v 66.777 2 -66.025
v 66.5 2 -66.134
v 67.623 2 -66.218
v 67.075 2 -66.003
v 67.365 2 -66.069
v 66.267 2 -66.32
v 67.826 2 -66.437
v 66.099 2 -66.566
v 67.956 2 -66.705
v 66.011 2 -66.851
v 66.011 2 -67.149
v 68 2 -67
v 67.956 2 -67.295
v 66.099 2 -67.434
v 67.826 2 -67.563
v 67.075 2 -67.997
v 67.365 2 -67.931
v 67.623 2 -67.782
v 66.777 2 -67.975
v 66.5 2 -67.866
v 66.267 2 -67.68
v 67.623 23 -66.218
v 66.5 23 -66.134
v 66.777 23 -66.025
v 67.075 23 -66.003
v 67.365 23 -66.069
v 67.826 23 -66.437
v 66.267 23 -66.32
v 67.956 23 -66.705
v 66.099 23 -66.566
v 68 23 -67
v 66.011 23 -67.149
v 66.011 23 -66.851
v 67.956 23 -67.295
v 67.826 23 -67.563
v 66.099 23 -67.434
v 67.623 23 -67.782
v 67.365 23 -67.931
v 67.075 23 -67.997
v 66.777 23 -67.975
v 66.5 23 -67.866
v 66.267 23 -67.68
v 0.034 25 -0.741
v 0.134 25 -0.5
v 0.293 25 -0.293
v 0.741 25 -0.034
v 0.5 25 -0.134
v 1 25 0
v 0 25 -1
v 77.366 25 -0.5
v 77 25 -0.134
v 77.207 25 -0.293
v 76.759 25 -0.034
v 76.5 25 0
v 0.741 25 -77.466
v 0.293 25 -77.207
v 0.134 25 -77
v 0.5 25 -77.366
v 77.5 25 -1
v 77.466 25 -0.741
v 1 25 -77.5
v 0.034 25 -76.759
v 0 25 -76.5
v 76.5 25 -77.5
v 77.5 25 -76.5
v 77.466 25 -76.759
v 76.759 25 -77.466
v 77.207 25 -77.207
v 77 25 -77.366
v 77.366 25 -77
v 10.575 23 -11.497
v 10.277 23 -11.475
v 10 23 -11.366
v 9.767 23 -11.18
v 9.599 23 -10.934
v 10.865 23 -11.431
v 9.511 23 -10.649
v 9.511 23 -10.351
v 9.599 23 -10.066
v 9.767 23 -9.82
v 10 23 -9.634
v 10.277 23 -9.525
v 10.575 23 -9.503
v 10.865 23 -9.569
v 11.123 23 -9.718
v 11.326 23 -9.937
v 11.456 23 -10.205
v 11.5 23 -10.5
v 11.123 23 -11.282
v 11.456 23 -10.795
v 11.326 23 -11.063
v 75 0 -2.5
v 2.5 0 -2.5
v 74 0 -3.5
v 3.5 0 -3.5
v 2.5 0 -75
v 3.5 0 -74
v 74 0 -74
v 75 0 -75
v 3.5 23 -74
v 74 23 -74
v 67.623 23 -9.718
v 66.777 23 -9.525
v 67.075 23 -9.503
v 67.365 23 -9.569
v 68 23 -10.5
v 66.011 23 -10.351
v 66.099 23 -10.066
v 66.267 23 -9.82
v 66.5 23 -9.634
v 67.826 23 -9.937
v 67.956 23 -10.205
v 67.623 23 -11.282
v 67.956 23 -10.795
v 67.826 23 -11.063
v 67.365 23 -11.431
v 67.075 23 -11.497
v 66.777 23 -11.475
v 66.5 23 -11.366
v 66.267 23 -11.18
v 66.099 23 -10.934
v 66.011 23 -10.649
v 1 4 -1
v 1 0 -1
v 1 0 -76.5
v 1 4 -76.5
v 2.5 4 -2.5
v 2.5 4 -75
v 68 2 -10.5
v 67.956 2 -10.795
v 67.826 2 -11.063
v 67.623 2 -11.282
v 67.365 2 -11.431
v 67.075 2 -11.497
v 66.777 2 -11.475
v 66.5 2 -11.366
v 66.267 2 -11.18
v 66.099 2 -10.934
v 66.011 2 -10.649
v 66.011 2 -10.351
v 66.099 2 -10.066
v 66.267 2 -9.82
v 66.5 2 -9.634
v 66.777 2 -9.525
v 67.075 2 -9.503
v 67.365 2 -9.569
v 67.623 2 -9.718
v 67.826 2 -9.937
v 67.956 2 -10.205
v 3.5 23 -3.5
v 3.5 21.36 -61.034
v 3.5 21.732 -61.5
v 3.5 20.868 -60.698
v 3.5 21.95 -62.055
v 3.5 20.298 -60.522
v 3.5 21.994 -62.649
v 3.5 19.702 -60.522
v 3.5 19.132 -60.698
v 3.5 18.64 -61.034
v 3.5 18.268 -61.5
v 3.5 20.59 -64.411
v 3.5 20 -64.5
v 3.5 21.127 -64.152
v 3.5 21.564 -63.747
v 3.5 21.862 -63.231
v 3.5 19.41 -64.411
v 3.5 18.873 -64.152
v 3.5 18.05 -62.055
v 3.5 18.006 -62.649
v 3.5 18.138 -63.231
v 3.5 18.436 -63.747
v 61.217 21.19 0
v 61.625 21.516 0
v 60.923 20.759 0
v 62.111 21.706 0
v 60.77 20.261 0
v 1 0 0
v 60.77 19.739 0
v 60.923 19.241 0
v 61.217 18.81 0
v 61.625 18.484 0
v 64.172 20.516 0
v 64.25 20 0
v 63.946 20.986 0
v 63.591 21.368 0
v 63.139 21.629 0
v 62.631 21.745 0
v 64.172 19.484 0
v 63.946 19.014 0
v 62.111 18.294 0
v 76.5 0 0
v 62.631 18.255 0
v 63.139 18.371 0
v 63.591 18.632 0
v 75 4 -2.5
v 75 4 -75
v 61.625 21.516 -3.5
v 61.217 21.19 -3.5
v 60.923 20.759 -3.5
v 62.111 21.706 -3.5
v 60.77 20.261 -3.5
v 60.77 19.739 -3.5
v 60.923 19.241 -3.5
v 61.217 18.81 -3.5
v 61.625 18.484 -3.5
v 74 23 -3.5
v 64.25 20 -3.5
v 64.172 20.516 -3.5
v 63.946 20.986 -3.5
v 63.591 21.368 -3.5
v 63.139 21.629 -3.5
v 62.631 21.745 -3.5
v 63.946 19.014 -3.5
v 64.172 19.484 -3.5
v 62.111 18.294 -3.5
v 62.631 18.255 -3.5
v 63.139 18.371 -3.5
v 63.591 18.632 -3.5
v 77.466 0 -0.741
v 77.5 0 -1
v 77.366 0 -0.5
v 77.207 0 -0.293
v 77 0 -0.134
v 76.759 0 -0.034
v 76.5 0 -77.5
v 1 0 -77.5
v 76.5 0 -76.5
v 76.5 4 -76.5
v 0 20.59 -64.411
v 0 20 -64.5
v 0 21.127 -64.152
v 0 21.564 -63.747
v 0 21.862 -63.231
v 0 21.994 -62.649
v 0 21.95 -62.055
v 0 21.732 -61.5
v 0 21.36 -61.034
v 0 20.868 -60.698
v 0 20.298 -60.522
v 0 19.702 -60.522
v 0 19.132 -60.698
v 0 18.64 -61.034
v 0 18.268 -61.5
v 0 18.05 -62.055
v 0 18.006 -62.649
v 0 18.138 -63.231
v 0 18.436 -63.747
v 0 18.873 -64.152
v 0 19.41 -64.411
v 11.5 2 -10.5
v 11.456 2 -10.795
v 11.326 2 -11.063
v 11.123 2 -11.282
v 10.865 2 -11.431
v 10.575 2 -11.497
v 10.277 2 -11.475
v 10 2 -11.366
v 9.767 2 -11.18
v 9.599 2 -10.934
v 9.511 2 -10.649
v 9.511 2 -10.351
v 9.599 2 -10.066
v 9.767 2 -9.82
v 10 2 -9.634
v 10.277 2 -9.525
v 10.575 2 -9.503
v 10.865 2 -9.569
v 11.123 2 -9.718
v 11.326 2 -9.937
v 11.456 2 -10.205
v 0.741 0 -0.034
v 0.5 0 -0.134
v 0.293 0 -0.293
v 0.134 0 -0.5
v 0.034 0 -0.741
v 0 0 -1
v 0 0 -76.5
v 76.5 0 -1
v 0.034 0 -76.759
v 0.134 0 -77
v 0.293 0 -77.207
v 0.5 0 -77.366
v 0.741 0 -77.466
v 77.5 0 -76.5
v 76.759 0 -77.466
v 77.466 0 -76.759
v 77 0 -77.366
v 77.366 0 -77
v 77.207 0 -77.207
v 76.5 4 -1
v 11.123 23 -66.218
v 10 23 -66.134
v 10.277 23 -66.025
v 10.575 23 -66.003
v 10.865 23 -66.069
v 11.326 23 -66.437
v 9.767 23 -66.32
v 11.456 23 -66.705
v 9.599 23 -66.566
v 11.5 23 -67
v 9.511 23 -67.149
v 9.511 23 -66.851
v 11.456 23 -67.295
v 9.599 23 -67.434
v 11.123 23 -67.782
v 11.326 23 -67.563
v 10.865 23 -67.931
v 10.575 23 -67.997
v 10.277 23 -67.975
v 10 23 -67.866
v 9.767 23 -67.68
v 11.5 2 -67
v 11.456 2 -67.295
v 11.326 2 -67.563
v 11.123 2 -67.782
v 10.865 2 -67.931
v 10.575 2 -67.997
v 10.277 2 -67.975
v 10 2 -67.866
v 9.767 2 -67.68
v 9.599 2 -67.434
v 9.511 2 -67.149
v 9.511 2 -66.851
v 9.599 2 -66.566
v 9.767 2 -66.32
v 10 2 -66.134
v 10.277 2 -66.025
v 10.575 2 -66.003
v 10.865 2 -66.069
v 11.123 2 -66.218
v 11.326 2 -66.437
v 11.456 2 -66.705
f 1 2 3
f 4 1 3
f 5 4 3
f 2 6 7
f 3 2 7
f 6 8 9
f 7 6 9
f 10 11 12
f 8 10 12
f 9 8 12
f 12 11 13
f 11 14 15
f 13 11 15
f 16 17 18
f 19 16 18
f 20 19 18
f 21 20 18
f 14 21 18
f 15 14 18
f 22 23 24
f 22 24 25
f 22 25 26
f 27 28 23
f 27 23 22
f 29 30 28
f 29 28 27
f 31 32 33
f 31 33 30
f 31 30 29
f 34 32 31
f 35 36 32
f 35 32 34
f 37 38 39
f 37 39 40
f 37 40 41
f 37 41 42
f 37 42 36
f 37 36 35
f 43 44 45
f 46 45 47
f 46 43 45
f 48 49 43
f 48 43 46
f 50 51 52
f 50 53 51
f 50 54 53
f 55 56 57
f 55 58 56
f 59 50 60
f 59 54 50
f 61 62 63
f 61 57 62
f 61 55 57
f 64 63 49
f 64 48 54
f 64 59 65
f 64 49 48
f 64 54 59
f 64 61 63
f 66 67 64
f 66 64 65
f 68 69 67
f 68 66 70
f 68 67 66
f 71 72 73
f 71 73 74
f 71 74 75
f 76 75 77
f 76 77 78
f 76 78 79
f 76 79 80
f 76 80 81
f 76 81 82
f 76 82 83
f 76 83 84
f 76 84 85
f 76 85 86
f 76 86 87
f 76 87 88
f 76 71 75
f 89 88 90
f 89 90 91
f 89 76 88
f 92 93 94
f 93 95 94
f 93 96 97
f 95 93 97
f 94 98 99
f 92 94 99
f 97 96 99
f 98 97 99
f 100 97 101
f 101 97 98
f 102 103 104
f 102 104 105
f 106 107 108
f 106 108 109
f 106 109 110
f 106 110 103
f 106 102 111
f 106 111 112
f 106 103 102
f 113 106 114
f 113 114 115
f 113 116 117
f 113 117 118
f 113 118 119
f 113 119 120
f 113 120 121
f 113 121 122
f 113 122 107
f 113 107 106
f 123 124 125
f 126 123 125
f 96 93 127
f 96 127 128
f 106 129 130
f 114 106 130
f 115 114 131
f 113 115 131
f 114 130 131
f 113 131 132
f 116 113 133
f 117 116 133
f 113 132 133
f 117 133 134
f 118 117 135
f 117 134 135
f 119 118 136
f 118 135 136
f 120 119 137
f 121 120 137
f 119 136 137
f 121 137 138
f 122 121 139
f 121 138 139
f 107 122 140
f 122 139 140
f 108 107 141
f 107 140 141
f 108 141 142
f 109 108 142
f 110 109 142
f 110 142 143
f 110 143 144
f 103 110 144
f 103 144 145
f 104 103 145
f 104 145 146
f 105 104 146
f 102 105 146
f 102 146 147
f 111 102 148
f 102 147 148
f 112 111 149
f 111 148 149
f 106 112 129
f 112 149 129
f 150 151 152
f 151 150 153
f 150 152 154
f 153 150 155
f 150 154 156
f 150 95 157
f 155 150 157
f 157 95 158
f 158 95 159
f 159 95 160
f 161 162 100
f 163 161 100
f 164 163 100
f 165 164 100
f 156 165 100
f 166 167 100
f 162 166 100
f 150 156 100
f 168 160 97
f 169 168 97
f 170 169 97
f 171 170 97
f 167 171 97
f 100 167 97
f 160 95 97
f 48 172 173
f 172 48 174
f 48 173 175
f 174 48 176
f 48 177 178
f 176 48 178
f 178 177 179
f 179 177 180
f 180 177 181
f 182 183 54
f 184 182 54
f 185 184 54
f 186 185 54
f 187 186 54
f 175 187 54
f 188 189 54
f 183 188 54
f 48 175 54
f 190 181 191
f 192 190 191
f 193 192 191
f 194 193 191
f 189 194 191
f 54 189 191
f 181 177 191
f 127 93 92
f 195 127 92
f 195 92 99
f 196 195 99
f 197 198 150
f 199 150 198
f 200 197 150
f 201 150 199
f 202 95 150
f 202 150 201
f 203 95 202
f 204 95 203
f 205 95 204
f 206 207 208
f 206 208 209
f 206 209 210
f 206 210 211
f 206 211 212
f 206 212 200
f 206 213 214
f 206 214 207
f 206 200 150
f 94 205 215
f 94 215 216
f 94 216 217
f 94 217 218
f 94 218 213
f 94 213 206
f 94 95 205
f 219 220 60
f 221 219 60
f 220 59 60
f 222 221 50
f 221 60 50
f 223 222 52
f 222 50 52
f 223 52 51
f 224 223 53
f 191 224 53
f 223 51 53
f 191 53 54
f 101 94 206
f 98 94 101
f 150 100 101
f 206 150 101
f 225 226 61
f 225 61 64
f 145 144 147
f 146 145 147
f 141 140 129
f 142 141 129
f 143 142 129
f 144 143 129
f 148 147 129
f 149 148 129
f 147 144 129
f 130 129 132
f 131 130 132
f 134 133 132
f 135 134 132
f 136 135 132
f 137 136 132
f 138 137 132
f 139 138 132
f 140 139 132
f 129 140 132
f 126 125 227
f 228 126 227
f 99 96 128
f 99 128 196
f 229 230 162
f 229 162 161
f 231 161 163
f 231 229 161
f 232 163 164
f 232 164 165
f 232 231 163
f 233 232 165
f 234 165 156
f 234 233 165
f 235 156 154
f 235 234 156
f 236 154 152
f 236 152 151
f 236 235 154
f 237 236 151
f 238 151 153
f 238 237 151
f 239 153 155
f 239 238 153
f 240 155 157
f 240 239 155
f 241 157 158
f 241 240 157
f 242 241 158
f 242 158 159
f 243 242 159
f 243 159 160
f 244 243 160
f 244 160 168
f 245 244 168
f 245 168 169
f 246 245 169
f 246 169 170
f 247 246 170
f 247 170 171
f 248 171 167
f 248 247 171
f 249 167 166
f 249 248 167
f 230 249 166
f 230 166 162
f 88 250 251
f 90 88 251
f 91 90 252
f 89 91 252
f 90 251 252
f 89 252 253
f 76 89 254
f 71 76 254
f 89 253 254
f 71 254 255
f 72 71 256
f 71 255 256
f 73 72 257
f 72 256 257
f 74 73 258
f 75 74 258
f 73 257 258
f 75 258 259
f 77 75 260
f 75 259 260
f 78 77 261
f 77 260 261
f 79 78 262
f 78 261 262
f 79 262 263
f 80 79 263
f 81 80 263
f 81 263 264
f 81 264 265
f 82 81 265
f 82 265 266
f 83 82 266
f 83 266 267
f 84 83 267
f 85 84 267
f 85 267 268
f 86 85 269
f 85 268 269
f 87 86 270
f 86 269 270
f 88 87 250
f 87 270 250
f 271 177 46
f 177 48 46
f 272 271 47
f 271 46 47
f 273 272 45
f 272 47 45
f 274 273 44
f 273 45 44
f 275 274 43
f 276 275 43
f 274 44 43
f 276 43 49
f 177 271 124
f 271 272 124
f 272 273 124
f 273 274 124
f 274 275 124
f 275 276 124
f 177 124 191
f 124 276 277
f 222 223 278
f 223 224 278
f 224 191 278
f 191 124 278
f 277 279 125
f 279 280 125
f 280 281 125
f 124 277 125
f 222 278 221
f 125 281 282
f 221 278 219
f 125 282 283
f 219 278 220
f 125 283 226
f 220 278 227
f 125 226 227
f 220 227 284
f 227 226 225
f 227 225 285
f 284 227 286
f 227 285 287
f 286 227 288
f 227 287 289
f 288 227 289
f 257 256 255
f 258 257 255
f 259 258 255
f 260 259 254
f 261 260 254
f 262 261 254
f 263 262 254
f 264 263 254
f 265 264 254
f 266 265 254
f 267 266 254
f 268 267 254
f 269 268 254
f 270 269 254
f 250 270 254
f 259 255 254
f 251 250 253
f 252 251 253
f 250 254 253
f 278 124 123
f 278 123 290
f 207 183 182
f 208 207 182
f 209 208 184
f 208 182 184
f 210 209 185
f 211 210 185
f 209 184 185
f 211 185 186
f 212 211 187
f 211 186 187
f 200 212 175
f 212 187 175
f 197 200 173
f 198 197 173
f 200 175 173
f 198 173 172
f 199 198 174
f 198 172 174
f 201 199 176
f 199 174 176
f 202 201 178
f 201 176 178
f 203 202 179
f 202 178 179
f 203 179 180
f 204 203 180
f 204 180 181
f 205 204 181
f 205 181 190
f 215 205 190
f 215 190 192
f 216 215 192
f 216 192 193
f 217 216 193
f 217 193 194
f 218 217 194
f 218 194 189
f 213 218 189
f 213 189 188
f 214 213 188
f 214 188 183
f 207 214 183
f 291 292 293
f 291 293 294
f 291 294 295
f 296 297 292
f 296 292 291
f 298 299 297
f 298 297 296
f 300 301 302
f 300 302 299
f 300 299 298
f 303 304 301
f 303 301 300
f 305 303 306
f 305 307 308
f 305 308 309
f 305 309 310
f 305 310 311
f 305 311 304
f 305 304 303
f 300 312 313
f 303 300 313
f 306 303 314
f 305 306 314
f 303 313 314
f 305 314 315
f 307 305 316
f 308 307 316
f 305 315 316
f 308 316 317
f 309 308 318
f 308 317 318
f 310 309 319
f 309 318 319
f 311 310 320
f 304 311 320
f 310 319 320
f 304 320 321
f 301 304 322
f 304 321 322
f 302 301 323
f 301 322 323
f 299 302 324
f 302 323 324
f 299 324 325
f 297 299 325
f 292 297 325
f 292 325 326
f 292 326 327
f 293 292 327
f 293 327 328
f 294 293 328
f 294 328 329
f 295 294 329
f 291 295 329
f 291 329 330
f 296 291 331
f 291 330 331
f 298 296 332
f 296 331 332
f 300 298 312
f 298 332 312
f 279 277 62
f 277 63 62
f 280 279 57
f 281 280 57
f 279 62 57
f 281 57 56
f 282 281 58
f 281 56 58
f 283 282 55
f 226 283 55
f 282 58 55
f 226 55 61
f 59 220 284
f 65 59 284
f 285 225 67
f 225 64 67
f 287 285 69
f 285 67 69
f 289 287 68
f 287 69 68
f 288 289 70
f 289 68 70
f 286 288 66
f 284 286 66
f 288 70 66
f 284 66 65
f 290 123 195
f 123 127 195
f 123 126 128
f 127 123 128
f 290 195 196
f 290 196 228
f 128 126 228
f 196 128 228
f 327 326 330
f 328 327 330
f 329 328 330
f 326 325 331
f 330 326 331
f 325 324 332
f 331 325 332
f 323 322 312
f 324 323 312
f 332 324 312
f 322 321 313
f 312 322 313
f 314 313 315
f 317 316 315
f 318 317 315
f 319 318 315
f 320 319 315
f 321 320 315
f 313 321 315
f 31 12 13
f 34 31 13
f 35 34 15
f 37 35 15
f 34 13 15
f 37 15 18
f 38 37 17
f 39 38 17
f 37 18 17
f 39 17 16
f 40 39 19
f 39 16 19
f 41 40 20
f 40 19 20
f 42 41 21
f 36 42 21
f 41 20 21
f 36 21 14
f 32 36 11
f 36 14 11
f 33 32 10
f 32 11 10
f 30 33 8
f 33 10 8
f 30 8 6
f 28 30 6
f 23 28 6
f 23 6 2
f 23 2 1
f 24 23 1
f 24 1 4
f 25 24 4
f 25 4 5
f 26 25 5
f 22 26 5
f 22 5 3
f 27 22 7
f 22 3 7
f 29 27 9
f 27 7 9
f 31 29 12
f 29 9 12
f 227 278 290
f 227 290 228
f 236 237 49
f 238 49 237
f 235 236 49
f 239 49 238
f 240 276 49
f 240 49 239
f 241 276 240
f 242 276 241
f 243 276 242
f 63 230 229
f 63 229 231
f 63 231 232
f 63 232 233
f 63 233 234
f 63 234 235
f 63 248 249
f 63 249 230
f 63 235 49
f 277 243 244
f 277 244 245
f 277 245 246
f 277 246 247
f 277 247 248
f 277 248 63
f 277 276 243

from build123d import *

# Parameters (mm, degrees)
SKETCH1_W             = 77.5
SKETCH1_H             = 77.5
BOSS_EXTRUDE1_DEPTH   = 25
SKETCH2_W             = 70.5
SKETCH2_H             = 70.5
CUT_EXTRUDE1_DEPTH    = 23
SKETCH4_W             = 75.5
SKETCH4_H             = 75.5
SKETCH4_W_2           = 72.5
SKETCH4_H_2           = 72.5
CUT_EXTRUDE3_DEPTH    = 4
BOSS_EXTRUDE2_START   = 2
SKETCH5_R             = 1
BOSS_EXTRUDE2_DEPTH   = 21
BOSS_EXTRUDE2_2_DEPTH = 21
BOSS_EXTRUDE2_3_DEPTH = 21
BOSS_EXTRUDE2_4_DEPTH = 21
SKETCH6_R             = 1.75
CUT_EXTRUDE4_DEPTH    = 7
SKETCH7_R             = 2
CUT_EXTRUDE6_DEPTH    = 3.5
FILLET6_R             = 1
FILLET7_R             = 1
FILLET8_R             = 1
FILLET9_R             = 1


with BuildPart() as part:
    # Sketch1 → Boss-Extrude1 (new body)
    with BuildSketch(Plane(origin=(0, 0, 0), x_dir=(1, 0, 0), z_dir=(0, 1, 0))):
        with Locations((38.75, 38.75)):
            Rectangle(SKETCH1_W, SKETCH1_H)
    extrude(amount=BOSS_EXTRUDE1_DEPTH)

    # Sketch2 → Cut-Extrude1 (cut)
    with BuildSketch(Plane(origin=(0, 0, 0), x_dir=(1, 0, 0), z_dir=(0, 1, 0))):
        with Locations((38.75, 38.75)):
            Rectangle(SKETCH2_W, SKETCH2_H)
    extrude(amount=CUT_EXTRUDE1_DEPTH, mode=Mode.SUBTRACT)

    # Sketch4 → Cut-Extrude3 (cut)
    with BuildSketch(Plane(origin=(0, 0, 0), x_dir=(1, 0, 0), z_dir=(0, 1, 0))):
        with Locations((38.75, 38.75)):
            Rectangle(SKETCH4_W, SKETCH4_H)
        with Locations((38.75, 38.75)):
            Rectangle(SKETCH4_W_2, SKETCH4_H_2, mode=Mode.SUBTRACT)
    extrude(amount=CUT_EXTRUDE3_DEPTH, mode=Mode.SUBTRACT)

    # Sketch6 → Cut-Extrude4 (cut)
    with BuildSketch(Plane.XY):
        with Locations((62.5, 20)):
            Circle(SKETCH6_R)
    extrude(amount=-CUT_EXTRUDE4_DEPTH, mode=Mode.SUBTRACT)

    # Sketch7 → Cut-Extrude6 (cut)
    with BuildSketch(Plane(origin=(0, 0, 0), x_dir=(0, 0, -1), z_dir=(1, 0, 0))):
        with Locations((62.5, 20)):
            Circle(SKETCH7_R)
    extrude(amount=CUT_EXTRUDE6_DEPTH, mode=Mode.SUBTRACT)

    # Fillet6
    fillet6_edges = [part.edges().sort_by_distance(p)[0] for p in [
        (77.5, 12.5, -77.5),
    ]]
    fillet(fillet6_edges, radius=FILLET6_R)

    # Fillet7
    fillet7_edges = [part.edges().sort_by_distance(p)[0] for p in [
        (77.5, 12.5, 0),
    ]]
    fillet(fillet7_edges, radius=FILLET7_R)

    # Fillet8
    fillet8_edges = [part.edges().sort_by_distance(p)[0] for p in [
        (0, 12.5, 0),
    ]]
    fillet(fillet8_edges, radius=FILLET8_R)

    # Fillet9
    fillet9_edges = [part.edges().sort_by_distance(p)[0] for p in [
        (0, 12.5, -77.5),
    ]]
    fillet(fillet9_edges, radius=FILLET9_R)


with BuildPart() as body_2:
    # Sketch5 → Boss-Extrude2 (new body)
    with BuildSketch(Plane(origin=(0, 0, 0), x_dir=(1, 0, 0), z_dir=(0, 1, 0)).offset(BOSS_EXTRUDE2_START)):
        with Locations((10.5, 10.5)):
            Circle(SKETCH5_R)
    extrude(amount=BOSS_EXTRUDE2_DEPTH)


with BuildPart() as body_3:
    # Sketch5 → Boss-Extrude2 2 (new body)
    with BuildSketch(Plane(origin=(0, 0, 0), x_dir=(1, 0, 0), z_dir=(0, 1, 0)).offset(BOSS_EXTRUDE2_START)):
        with Locations((67, 10.5)):
            Circle(SKETCH5_R)
    extrude(amount=BOSS_EXTRUDE2_2_DEPTH)


with BuildPart() as body_4:
    # Sketch5 → Boss-Extrude2 3 (new body)
    with BuildSketch(Plane(origin=(0, 0, 0), x_dir=(1, 0, 0), z_dir=(0, 1, 0)).offset(BOSS_EXTRUDE2_START)):
        with Locations((67, 67)):
            Circle(SKETCH5_R)
    extrude(amount=BOSS_EXTRUDE2_3_DEPTH)


with BuildPart() as body_5:
    # Sketch5 → Boss-Extrude2 4 (new body)
    with BuildSketch(Plane(origin=(0, 0, 0), x_dir=(1, 0, 0), z_dir=(0, 1, 0)).offset(BOSS_EXTRUDE2_START)):
        with Locations((10.5, 67)):
            Circle(SKETCH5_R)
    extrude(amount=BOSS_EXTRUDE2_4_DEPTH)


solid = Compound([part.part, body_2.part, body_3.part, body_4.part, body_5.part])
